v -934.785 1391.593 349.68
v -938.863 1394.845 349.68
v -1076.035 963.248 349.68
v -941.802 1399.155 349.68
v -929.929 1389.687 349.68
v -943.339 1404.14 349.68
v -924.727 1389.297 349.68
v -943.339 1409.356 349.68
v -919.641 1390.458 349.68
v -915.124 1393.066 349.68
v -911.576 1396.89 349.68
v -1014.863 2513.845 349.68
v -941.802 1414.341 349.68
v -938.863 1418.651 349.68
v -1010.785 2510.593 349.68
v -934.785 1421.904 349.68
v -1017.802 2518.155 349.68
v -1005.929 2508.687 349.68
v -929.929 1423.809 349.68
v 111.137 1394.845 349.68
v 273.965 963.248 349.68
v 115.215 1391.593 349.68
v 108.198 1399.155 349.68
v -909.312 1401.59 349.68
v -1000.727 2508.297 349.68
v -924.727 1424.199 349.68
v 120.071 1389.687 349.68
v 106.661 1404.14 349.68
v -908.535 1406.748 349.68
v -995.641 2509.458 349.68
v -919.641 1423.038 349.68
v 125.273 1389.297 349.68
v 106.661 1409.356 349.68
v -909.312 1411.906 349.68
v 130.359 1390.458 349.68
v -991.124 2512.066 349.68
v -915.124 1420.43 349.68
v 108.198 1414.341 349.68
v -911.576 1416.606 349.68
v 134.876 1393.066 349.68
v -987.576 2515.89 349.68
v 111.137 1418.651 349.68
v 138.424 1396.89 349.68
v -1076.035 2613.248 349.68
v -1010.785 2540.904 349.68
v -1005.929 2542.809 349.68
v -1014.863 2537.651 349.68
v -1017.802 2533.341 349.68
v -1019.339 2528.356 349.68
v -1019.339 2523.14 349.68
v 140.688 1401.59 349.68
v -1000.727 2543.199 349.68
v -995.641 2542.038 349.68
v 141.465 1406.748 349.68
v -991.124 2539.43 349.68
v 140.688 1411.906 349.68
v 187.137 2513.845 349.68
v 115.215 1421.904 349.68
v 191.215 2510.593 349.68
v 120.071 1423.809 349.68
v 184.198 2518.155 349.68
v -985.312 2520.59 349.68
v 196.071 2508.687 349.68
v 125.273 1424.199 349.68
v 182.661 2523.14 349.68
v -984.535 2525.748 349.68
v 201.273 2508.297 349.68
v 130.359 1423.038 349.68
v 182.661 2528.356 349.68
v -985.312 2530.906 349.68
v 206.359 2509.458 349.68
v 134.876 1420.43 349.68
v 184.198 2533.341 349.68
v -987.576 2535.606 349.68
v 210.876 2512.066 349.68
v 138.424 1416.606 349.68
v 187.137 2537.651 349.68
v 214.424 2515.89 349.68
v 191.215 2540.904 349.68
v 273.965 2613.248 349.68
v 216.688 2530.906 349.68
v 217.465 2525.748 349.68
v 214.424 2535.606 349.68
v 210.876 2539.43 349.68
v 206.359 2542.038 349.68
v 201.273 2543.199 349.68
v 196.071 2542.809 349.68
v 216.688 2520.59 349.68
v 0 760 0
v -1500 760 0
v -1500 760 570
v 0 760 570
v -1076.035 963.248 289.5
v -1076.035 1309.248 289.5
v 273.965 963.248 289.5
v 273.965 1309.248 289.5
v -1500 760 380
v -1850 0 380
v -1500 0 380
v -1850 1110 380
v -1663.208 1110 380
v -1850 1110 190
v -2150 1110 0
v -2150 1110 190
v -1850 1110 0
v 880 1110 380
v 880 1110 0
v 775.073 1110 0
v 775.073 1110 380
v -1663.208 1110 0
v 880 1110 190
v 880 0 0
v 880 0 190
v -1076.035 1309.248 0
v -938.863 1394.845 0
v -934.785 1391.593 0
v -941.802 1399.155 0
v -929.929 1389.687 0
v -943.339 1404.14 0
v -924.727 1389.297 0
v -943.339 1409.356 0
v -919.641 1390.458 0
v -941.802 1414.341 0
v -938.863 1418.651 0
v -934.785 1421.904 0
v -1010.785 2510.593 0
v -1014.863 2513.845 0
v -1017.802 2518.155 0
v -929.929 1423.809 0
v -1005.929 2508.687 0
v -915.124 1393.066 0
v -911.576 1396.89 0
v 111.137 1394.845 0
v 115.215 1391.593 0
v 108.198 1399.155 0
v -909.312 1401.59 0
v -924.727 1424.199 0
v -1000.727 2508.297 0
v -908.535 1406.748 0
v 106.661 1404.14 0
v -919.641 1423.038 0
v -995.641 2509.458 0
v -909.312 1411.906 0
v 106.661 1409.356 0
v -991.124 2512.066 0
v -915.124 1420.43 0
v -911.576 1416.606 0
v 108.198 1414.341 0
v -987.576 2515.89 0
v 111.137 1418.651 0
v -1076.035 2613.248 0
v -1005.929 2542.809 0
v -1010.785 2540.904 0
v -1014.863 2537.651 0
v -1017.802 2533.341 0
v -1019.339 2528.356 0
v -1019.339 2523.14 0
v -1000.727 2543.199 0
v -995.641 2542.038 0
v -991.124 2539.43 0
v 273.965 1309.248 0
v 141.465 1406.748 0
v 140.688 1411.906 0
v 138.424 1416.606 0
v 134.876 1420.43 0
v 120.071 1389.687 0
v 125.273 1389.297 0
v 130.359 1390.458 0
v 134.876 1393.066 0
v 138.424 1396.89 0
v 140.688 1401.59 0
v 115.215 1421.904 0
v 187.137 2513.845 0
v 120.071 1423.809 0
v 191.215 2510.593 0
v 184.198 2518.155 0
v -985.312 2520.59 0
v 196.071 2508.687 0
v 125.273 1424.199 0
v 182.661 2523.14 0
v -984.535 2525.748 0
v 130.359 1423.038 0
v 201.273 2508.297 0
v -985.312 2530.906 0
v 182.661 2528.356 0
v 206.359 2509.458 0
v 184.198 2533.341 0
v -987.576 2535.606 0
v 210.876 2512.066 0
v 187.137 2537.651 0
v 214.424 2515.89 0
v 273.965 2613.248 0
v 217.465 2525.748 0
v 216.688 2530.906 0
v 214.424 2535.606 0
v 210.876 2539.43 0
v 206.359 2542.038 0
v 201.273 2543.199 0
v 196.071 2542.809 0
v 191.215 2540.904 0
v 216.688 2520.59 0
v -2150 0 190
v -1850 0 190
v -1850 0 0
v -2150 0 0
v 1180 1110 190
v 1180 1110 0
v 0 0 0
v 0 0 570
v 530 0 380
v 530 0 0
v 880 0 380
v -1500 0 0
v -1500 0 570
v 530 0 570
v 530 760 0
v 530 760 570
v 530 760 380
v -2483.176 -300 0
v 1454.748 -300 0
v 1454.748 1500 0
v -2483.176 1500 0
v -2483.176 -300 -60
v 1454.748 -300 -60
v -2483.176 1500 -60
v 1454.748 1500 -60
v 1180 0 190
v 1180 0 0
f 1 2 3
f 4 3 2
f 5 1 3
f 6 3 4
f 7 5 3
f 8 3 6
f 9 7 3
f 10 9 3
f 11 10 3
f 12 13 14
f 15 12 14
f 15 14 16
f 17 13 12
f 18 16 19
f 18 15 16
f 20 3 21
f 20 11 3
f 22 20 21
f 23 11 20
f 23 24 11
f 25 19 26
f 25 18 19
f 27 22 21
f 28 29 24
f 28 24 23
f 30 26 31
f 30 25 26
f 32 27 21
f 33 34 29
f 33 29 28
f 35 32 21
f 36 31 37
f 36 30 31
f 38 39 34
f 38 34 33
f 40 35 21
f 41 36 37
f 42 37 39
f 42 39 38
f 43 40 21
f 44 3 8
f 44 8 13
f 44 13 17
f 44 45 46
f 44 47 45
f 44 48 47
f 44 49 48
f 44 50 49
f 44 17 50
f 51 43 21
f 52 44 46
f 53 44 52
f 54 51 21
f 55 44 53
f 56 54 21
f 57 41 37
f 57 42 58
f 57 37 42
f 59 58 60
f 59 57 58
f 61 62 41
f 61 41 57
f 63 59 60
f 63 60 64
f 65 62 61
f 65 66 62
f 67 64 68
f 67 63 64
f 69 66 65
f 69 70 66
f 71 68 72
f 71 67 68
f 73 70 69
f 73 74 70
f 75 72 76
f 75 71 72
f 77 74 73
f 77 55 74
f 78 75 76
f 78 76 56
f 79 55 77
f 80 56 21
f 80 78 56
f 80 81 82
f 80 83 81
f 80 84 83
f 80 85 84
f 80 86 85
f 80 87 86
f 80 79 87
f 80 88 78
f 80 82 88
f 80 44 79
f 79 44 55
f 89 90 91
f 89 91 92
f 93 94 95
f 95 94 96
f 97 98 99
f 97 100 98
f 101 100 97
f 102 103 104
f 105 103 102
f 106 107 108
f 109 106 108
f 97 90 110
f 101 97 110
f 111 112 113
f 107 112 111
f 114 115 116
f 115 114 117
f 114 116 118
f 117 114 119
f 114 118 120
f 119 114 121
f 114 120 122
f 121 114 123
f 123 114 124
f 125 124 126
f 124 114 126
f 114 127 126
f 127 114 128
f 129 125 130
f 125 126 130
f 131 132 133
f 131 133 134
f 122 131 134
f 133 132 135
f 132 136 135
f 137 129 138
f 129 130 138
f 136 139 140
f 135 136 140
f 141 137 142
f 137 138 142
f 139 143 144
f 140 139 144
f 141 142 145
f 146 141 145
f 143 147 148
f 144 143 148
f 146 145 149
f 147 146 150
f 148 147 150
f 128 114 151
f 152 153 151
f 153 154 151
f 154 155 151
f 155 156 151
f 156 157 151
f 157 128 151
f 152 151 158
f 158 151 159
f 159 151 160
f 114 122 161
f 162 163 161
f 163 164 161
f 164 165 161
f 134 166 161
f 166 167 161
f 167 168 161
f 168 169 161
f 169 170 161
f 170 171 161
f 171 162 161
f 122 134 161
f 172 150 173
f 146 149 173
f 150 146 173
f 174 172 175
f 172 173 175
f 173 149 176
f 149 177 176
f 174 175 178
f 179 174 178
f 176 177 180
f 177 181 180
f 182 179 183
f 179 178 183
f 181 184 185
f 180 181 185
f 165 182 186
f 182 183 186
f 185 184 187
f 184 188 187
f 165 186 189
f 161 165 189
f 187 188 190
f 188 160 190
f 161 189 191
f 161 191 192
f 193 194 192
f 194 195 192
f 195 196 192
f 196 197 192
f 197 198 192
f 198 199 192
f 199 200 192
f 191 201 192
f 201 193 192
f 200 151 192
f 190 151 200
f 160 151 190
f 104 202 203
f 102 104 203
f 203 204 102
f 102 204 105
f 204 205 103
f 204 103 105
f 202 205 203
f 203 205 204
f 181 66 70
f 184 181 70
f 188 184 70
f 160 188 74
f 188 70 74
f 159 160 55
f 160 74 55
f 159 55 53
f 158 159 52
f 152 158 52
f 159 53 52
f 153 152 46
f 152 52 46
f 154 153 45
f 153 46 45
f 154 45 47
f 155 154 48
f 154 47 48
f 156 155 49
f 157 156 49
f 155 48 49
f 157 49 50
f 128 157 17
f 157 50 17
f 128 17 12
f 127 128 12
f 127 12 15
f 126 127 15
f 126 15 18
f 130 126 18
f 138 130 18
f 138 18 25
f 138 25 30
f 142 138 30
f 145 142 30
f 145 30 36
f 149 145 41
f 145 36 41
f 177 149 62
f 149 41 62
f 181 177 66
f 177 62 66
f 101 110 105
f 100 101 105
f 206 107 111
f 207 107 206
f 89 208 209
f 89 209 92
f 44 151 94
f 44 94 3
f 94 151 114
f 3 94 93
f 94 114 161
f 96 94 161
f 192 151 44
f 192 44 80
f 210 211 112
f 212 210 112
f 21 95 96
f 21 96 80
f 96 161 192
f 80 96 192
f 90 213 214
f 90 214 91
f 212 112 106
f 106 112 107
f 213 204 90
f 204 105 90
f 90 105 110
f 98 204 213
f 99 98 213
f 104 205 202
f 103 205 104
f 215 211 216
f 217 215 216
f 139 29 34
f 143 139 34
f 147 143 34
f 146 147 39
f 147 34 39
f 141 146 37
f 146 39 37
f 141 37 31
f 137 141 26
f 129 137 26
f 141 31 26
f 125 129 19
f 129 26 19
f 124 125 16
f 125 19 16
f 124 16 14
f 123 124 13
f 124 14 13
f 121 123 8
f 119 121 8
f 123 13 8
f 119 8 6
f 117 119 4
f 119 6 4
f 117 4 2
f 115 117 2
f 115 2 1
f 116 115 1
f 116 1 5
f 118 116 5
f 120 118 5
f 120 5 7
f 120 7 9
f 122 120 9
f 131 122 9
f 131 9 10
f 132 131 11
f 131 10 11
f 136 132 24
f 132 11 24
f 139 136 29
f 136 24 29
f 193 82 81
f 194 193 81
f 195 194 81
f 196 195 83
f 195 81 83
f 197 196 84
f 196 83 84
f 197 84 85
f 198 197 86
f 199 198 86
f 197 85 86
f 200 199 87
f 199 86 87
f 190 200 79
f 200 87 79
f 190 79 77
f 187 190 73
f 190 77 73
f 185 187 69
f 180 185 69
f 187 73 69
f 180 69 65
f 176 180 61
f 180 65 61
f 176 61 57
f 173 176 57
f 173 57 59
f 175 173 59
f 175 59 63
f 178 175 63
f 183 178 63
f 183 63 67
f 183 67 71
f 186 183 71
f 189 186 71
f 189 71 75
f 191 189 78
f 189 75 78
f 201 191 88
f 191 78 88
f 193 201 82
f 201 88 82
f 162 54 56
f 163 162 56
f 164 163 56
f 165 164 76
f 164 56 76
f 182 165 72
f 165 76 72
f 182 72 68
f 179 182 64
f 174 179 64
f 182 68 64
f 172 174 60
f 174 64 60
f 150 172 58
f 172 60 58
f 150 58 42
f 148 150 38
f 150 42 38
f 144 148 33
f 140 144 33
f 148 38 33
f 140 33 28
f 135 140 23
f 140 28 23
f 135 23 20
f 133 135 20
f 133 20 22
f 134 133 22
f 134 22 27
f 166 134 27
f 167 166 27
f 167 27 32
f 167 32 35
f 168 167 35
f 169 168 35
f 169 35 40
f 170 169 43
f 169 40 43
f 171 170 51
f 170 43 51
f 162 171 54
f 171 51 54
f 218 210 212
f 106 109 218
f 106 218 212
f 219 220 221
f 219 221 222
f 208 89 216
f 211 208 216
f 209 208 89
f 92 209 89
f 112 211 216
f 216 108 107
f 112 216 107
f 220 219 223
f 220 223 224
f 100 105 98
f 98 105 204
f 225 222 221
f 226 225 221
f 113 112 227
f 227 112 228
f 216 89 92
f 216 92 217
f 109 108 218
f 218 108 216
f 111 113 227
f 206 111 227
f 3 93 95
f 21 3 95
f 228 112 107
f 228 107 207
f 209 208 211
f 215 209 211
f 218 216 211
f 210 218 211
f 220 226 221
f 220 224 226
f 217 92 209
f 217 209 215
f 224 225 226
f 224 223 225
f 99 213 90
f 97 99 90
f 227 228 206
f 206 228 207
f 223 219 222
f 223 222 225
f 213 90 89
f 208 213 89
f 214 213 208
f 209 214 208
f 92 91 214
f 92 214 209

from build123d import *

# Parameters (mm, degrees)
F0_W          = 300
F0_H          = 1110
F1_DEPTH      = 190
F2_DEPTH      = 380
F0_W_2        = 1500
F0_H_2        = 760
F3_DEPTH      = 570
F0_W_3        = 530
F4_DEPTH      = 570
F6_DEPTH      = 300
F6_DEPTH_BACK = 1500
F7_W          = 1350
F7_H          = 1304
F8_DEPTH      = 289.5
F9_W          = 1350
F9_H          = 346
F9_H_2        = 1304
F10_DEPTH     = 60.18
F11_R         = 17.5
F12_DEPTH     = 349.68


with BuildPart() as f1:
    # F0 (on Top) → F1 (new body)
    with BuildSketch(Plane.XY):
        with Locations((-2000, 555)):
            Rectangle(F0_W, F0_H)
        with Locations((1030, 555)):
            Rectangle(F0_W, F0_H)
    extrude(amount=F1_DEPTH)


with BuildPart() as f2:
    # F0 (on Top) → F2 (new body)
    with BuildSketch(Plane.XY):
        Polygon((-1850, 0), (-1500, 0), (-1500, 760), (-1663.20768, 1110), (-1850, 1110), align=None)
        Polygon((530, 760), (530, 0), (880, 0), (880, 1110), (775.072638, 1110), align=None)
    extrude(amount=F2_DEPTH)


with BuildPart() as f3:
    # F0 (on Top) → F3 (new body)
    with BuildSketch(Plane.XY):
        with Locations((-750, 380)):
            Rectangle(F0_W_2, F0_H_2)
    extrude(amount=F3_DEPTH)


with BuildPart() as f4:
    # F0 (on Top) → F4 (new body, through all)
    with BuildSketch(Plane.XY):
        with Locations((265, 380)):
            Rectangle(F0_W_3, F0_H_2)
    extrude(amount=F4_DEPTH)


with BuildPart() as f6:
    # F5 (on face) → F6 (new body, two sides)
    with BuildSketch(Plane.XZ) as f6_sk:
        Polygon((1454.748034, -60), (1454.748034, 0), (0, 0), (-1500, 0), (-2483.175516, 0), (-2483.175516, -60), align=None)
    extrude(amount=F6_DEPTH)
    extrude(f6_sk.sketch, amount=-F6_DEPTH_BACK)


with BuildPart() as f8:
    # F7 (on Top) → F8 (new body)
    with BuildSketch(Plane.XY):
        with Locations((-401.034784, 1961.248209)):
            Rectangle(F7_W, F7_H)
    extrude(amount=F8_DEPTH)

    # F9 (on face) → F10 (join)
    with BuildSketch(Plane.XY.offset(289.5)):
        with Locations((-401.034784, 1136.248209)):
            Rectangle(F9_W, F9_H)
        with Locations((-401.034784, 1961.248209)):
            Rectangle(F9_W, F9_H_2)
    extrude(amount=F10_DEPTH)

    # F11 (on face) → F12 (cut, through all)
    with BuildSketch(Plane.XY.offset(349.68)):
        with Locations((199.965216, 2525.748209)):
            Circle(F11_R)
        with Locations((123.965216, 1406.748209)):
            Circle(F11_R)
        with Locations((-926.034784, 1406.748209)):
            Circle(F11_R)
        with Locations((-1002.034784, 2525.748209)):
            Circle(F11_R)
    extrude(amount=-F12_DEPTH, mode=Mode.SUBTRACT)


solid = Compound([f1.part, f2.part, f3.part, f4.part, f6.part, f8.part])
